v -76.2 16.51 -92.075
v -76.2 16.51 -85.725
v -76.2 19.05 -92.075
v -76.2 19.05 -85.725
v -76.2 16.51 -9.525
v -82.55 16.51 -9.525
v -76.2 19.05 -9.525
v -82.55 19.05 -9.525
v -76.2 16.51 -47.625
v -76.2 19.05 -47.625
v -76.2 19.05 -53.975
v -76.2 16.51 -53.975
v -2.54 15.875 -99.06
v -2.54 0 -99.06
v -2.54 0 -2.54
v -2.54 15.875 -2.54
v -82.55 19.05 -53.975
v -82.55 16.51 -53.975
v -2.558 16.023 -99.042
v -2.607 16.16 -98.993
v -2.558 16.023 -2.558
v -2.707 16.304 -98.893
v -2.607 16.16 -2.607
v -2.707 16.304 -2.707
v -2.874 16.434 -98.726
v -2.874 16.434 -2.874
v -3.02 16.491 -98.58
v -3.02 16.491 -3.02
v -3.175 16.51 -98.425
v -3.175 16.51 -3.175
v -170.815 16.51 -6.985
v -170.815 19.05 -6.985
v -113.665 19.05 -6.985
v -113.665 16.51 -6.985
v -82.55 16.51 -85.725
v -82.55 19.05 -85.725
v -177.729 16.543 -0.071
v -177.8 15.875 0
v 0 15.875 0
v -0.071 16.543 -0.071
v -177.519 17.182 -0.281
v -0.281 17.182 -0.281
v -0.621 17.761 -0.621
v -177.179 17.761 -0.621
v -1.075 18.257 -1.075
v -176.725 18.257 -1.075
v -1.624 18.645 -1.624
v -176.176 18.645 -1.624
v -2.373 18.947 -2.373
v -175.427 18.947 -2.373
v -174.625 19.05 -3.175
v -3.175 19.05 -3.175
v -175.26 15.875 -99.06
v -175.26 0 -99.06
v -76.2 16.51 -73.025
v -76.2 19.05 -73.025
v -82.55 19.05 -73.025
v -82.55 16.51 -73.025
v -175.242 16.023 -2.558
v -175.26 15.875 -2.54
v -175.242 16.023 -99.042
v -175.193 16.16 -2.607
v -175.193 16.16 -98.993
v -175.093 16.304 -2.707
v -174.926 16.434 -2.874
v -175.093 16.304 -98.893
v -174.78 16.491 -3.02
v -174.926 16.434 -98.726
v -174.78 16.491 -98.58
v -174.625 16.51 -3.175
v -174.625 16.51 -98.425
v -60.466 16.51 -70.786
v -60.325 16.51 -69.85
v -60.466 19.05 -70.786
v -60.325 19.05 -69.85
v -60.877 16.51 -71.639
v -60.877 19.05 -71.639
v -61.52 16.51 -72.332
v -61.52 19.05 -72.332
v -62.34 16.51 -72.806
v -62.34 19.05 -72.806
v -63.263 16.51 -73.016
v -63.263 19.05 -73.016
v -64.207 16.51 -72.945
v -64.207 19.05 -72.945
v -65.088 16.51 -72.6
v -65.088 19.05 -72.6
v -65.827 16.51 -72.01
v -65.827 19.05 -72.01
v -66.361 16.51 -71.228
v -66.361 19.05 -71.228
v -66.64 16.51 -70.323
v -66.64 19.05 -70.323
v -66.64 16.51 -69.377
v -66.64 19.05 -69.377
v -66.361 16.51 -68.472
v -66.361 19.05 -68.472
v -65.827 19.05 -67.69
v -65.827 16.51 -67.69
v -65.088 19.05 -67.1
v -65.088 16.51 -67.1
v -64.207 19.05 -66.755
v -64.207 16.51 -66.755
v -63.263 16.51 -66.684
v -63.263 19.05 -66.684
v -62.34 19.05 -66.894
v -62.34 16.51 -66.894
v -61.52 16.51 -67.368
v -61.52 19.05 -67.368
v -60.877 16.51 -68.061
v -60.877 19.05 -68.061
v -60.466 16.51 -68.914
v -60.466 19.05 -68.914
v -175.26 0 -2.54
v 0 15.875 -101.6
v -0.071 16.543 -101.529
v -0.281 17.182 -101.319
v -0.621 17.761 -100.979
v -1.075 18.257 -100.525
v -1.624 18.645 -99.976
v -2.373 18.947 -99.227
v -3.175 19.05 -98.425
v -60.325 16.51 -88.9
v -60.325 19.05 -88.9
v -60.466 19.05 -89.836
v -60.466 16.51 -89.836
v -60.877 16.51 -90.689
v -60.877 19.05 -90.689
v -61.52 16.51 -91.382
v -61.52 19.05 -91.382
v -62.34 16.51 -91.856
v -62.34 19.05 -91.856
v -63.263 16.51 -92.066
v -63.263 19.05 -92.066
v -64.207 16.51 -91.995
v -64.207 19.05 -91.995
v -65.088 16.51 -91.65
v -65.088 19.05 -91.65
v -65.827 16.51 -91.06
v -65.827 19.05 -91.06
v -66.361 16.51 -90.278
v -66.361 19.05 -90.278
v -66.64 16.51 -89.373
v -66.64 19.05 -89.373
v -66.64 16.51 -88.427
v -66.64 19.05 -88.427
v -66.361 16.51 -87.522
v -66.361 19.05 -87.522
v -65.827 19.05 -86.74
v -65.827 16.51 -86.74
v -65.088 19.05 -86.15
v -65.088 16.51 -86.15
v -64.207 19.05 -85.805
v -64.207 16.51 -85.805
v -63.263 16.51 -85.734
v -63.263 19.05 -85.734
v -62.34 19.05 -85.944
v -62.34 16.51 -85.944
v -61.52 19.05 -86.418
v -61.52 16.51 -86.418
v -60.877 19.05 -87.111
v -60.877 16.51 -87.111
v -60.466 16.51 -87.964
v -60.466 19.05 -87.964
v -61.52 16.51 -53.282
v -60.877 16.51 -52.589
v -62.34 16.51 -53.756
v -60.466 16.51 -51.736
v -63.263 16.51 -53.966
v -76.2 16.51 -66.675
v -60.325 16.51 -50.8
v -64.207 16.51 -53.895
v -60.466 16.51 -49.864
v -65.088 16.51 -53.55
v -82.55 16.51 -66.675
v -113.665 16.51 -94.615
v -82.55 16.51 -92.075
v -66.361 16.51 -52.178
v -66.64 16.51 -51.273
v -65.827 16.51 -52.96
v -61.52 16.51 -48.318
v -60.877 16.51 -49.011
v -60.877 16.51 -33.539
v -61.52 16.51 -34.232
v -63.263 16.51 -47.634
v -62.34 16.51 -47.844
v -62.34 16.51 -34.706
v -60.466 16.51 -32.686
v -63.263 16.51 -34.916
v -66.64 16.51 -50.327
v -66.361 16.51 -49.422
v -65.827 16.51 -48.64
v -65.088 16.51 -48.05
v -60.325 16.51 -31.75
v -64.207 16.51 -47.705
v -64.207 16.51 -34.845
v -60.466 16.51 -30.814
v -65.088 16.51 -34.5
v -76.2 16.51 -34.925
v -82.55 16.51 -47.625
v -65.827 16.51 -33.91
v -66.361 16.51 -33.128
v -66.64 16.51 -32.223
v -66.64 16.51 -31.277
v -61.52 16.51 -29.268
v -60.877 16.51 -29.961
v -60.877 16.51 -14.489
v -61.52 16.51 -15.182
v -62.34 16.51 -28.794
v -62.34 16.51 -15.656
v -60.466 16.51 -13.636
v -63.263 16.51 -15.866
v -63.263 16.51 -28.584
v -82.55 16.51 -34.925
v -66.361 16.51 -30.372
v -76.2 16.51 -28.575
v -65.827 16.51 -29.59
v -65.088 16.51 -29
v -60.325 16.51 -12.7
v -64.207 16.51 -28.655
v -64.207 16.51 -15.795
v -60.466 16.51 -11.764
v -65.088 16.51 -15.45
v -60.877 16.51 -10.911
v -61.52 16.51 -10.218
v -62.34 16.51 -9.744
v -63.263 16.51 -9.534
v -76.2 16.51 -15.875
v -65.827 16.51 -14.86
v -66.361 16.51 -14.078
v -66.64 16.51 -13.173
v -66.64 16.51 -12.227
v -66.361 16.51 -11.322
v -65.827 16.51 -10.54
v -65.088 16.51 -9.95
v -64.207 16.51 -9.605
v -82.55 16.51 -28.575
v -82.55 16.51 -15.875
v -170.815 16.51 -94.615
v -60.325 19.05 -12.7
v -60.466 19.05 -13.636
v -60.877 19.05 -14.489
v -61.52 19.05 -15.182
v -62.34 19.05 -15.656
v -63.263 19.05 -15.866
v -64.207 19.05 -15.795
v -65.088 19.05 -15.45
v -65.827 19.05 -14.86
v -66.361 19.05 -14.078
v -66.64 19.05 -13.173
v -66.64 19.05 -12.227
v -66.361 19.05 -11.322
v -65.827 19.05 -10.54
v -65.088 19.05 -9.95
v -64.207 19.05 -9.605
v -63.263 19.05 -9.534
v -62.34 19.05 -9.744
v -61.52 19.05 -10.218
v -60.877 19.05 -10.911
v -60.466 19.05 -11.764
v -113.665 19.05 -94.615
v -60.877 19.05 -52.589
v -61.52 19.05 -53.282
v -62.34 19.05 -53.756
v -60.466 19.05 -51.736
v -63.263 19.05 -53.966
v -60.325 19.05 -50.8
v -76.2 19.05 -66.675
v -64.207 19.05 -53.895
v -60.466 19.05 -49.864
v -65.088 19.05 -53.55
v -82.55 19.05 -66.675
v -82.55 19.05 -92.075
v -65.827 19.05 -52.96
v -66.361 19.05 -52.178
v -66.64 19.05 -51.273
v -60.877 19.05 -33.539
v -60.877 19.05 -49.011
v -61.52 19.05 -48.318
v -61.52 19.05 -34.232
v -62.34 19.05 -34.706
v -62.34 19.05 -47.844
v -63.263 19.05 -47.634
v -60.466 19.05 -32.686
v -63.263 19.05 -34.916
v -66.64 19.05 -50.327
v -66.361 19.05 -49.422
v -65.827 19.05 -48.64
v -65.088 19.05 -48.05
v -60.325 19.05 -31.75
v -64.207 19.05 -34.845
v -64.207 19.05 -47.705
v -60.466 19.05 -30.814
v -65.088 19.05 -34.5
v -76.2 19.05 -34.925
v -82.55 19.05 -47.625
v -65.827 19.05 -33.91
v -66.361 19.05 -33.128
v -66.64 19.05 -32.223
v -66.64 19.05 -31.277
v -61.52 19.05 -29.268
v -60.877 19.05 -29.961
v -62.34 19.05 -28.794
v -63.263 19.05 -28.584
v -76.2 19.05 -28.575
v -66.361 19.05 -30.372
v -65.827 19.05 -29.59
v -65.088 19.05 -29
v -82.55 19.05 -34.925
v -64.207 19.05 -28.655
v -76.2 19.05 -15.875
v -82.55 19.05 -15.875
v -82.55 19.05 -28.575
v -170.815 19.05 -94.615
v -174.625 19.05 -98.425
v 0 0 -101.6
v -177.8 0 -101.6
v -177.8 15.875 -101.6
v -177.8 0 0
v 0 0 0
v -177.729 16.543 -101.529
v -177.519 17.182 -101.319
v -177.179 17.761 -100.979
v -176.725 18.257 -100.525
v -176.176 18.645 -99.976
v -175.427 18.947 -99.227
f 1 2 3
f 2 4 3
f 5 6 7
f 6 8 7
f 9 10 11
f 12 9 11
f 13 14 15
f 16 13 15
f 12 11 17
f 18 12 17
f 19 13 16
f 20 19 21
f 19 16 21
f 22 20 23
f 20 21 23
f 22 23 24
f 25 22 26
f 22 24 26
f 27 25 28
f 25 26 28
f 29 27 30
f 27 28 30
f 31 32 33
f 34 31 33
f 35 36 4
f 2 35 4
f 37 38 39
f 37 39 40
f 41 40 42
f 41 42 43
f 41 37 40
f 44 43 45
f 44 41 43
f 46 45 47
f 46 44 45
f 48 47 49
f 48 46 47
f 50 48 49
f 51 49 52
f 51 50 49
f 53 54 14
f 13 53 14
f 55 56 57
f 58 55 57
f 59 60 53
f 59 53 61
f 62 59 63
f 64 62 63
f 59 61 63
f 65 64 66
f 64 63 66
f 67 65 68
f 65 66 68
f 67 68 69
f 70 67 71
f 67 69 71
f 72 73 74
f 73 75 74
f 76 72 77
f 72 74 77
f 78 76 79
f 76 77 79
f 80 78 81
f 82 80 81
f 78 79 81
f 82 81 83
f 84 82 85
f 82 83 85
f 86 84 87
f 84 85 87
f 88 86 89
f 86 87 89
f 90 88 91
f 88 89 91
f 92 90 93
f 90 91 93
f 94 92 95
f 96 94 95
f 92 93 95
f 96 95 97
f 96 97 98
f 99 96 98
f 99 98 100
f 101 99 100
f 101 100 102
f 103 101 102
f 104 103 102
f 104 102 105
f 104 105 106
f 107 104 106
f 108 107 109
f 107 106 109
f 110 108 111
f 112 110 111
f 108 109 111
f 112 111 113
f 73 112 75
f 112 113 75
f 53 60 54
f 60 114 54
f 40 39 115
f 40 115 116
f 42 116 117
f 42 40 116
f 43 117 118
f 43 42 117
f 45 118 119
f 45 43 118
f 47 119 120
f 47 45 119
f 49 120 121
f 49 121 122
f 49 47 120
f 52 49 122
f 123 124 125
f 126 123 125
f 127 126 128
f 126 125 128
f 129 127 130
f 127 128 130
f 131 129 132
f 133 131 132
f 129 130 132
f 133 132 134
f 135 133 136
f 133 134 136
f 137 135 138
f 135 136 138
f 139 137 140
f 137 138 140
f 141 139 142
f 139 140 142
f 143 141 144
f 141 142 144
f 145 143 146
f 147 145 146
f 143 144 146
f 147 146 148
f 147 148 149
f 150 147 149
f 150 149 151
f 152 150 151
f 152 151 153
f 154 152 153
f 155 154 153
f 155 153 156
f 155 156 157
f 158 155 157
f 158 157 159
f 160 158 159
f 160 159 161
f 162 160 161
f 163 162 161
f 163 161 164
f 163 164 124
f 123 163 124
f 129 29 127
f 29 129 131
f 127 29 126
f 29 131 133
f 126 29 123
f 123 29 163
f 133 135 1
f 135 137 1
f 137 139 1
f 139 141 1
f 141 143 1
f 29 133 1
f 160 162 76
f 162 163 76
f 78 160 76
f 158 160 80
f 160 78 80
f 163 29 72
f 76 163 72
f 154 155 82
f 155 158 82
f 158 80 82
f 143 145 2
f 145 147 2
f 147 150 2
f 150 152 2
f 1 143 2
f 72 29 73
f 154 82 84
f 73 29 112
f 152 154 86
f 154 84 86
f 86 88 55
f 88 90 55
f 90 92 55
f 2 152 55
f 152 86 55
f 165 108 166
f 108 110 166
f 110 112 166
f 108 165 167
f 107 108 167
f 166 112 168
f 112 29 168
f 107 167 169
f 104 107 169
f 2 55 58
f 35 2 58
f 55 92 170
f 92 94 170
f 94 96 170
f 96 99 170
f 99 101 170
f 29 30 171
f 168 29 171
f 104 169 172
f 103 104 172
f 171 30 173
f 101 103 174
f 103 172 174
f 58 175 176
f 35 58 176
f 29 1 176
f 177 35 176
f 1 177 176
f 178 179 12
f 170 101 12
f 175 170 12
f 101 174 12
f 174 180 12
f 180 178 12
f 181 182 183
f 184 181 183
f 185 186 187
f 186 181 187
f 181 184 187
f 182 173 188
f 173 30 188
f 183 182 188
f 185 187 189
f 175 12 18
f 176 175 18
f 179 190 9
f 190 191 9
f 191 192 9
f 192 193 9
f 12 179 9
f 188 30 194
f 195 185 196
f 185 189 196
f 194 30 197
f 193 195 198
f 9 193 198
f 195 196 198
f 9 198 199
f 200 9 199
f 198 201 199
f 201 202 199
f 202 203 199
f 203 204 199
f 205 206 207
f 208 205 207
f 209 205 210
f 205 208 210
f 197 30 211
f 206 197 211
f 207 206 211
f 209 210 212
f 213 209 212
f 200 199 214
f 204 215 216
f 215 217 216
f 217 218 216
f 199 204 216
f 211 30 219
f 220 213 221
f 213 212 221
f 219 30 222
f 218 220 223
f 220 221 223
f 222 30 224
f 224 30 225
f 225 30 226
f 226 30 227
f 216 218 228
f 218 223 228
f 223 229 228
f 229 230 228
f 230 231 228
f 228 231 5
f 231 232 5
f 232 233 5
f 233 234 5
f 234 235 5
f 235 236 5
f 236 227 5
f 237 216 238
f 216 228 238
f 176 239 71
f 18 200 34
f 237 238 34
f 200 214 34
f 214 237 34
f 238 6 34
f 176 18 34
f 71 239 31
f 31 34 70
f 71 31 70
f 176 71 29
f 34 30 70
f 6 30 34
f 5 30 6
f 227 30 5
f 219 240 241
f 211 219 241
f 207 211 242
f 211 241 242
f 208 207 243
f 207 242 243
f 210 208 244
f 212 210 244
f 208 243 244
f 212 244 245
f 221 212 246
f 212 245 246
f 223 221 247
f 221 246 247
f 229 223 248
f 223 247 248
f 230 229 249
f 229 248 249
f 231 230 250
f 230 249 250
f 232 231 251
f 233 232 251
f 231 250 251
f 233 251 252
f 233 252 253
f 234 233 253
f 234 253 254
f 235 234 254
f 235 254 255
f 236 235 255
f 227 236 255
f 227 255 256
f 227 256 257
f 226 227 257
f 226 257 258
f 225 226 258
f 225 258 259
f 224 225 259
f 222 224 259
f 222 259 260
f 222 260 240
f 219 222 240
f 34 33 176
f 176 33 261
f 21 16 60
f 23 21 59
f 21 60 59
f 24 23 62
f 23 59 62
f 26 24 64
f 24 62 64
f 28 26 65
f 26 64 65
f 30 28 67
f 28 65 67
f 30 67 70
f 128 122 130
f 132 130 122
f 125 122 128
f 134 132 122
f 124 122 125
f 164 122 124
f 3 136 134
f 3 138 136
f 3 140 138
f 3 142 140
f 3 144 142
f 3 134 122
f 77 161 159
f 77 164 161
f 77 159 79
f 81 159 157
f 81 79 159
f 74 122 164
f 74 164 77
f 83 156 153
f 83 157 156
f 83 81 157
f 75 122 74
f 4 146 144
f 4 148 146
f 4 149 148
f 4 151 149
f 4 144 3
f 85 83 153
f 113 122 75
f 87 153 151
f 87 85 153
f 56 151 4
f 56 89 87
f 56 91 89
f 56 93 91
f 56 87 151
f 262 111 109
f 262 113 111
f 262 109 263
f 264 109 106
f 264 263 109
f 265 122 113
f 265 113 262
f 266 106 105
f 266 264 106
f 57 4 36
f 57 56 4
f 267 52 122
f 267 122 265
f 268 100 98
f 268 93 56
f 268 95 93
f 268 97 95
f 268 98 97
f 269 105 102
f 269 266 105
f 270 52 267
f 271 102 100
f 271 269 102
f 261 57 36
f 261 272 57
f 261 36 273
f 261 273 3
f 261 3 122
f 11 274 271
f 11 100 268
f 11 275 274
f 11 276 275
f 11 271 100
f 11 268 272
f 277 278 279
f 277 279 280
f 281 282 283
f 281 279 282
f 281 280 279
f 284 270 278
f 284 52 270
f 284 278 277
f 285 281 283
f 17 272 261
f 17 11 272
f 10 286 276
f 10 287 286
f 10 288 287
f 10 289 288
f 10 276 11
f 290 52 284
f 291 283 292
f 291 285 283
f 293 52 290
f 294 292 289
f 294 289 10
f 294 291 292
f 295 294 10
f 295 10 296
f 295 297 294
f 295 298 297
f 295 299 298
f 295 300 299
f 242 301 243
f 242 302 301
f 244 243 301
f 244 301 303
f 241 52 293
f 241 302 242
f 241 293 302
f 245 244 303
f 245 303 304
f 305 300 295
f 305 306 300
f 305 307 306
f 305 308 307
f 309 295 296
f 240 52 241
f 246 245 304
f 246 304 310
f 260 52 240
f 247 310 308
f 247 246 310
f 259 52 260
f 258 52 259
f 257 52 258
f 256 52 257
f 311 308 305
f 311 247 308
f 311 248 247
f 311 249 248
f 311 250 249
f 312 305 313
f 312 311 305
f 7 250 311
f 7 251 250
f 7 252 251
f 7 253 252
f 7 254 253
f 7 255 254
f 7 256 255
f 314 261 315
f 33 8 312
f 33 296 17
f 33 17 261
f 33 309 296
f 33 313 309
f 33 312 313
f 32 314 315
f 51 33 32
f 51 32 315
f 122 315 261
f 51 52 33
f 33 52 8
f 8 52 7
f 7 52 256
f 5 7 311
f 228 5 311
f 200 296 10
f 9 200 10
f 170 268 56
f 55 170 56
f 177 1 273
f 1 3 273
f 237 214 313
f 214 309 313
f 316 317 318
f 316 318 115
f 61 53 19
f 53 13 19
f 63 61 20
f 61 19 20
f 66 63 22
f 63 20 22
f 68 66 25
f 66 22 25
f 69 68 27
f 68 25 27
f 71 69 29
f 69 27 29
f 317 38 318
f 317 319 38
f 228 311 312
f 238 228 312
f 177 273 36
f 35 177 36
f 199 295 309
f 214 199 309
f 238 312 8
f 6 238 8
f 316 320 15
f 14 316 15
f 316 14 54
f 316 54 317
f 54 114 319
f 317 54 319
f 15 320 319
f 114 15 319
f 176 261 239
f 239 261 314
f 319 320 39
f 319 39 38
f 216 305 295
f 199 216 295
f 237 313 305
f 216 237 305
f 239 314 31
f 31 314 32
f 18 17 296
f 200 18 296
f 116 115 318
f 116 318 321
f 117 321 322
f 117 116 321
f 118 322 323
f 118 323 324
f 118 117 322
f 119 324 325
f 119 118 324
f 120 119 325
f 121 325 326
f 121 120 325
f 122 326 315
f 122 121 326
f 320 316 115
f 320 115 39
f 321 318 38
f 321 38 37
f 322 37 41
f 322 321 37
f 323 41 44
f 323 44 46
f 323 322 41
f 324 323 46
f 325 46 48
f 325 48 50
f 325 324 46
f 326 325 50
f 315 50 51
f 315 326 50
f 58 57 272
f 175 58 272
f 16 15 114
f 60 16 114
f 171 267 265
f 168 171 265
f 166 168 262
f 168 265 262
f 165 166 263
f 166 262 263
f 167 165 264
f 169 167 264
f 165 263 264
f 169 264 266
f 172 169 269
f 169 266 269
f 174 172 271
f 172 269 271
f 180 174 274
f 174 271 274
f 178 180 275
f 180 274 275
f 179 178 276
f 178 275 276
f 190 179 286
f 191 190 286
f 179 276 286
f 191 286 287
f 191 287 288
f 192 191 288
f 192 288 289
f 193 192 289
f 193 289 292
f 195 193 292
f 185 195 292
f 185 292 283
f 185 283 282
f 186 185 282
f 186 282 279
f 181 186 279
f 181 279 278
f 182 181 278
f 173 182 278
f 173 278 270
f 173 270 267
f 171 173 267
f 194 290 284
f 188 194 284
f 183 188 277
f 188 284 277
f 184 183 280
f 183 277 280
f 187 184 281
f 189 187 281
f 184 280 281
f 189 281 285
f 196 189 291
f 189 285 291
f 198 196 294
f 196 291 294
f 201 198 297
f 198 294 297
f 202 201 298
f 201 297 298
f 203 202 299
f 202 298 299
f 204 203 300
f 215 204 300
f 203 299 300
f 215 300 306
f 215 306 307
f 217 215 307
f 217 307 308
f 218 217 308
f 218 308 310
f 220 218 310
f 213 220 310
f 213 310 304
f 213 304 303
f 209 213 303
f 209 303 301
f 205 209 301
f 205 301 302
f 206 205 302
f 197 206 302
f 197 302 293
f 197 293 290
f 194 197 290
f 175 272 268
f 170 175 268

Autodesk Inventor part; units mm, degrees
ref_plane "YZ Plane" through (0, 0, 0) normal (1, 0, 0) x (0, 1, 0)
ref_plane "XZ Plane" through (0, 0, 0) normal (0, 1, 0) x (-1, 0, 0)
ref_plane "XY Plane" through (0, 0, 0) normal (0, 0, 1) x (1, 0, 0)
sketch "Sketch1" plane through (0, 0, 0) normal (0, 1, 0) x (-1, 0, 0)
  line L0 (0, 0) -> (177.8, 0)
  line L1 (177.8, 0) -> (177.8, -101.6)
  line L2 (177.8, -101.6) -> (0, -101.6)
  line L3 (0, -101.6) -> (0, 0)
  point P0 (177.8, -50.8)
  point P1 (88.9, 0)
  point P2 (0, -50.8)
  dimension "d0" = 177.8
  dimension "d1" = 101.6
extrude "Extrusion1" add sketch "Sketch1" along normal blind 19.05
fillet "Fillet1" radius 3.175 4 edges at (-88.9, 19.05, 0) (-177.8, 19.05, -50.8) (-88.9, 19.05, -101.6) (0, 19.05, -50.8)
sketch "Sketch2" plane through (0, 19.05, 0) normal (0, 1, 0) x (1, 0, 0)
  line L0 (-170.815, 6.985) -> (-113.665, 6.985)
  line L1 (-113.665, 6.985) -> (-113.665, 94.615)
  line L2 (-113.665, 94.615) -> (-170.815, 94.615)
  line L3 (-170.815, 94.615) -> (-170.815, 6.985)
  line L4 (-177.8, 0) -> (0, 0) projected
  line L5 (-177.8, 101.6) -> (-177.8, 0) projected
  line L6 (-82.55, 9.525) -> (-76.2, 9.525)
  line L7 (-76.2, 9.525) -> (-76.2, 15.875)
  line L8 (-76.2, 15.875) -> (-82.55, 15.875)
  line L9 (-82.55, 15.875) -> (-82.55, 9.525)
  line L10 (0, 0) -> (0, 101.6) projected
  line L11 (-82.55, 28.575) -> (-76.2, 28.575)
  line L12 (-76.2, 28.575) -> (-76.2, 34.925)
  line L13 (-76.2, 34.925) -> (-82.55, 34.925)
  line L14 (-82.55, 34.925) -> (-82.55, 28.575)
  line L15 (-82.55, 47.625) -> (-76.2, 47.625)
  line L16 (-76.2, 47.625) -> (-76.2, 53.975)
  line L17 (-76.2, 53.975) -> (-82.55, 53.975)
  line L18 (-82.55, 53.975) -> (-82.55, 47.625)
  line L19 (-82.55, 66.675) -> (-76.2, 66.675)
  line L20 (-76.2, 66.675) -> (-76.2, 73.025)
  line L21 (-76.2, 73.025) -> (-82.55, 73.025)
  line L22 (-82.55, 73.025) -> (-82.55, 66.675)
  line L23 (-82.55, 85.725) -> (-76.2, 85.725)
  line L24 (-76.2, 85.725) -> (-76.2, 92.075)
  line L25 (-76.2, 92.075) -> (-82.55, 92.075)
  line L26 (-82.55, 92.075) -> (-82.55, 85.725)
  circle A0 centre (-63.5, 12.7) radius 3.175
  circle A1 centre (-63.5, 31.75) radius 3.175
  circle A2 centre (-63.5, 50.8) radius 3.175
  circle A3 centre (-63.5, 69.85) radius 3.175
  circle A4 centre (-63.5, 88.9) radius 3.175
  line L27 (0, 101.6) -> (-177.8, 101.6) projected
  point P0 (-79.375, 15.875)
  point P1 (-79.375, 28.575)
  point P2 (-79.375, 34.925)
  point P3 (-79.375, 47.625)
  dimension "d47" = 87.63
  dimension "d48" = 57.15
  dimension "d49" = 6.985
  dimension "d50" = 6.985
  dimension "d51" = 6.35
  dimension "d52" = 6.35
  dimension "d53" = 9.525
  dimension "d54" = 76.2
  dimension "d55" = 6.35
  dimension "d56" = 6.35
  dimension "d57" = 6.35
  dimension "d58" = 6.35
  dimension "d59" = 6.35
  dimension "d60" = 6.35
  dimension "d61" = 6.35
  dimension "d62" = 6.35
  dimension "d63" = 12.7
  dimension "d64" = 12.7
  dimension "d65" = 12.7
  dimension "d66" = 12.7
  dimension "d67" = 76.2
  dimension "d68" = 6.35
  dimension "d69" = 6.35
  dimension "d70" = 6.35
  dimension "d71" = 6.35
  dimension "d72" = 6.35
  dimension "d73" = 63.5
  dimension "d74" = 63.5
  dimension "d75" = 63.5
  dimension "d76" = 63.5
  dimension "d77" = 63.5
  dimension "d78" = 12.7
  dimension "d79" = 19.05
  dimension "d80" = 19.05
  dimension "d81" = 19.05
  dimension "d82" = 19.05
shell "Shell2" thickness 2.54 removed faces 1 at (-59.2667, 0, -33.8667)
extrude "Extrusion2" cut sketch "Sketch2" against normal blind 19.05 contours L3 L2 L1 L0 | L9 L8 L7 L6 | L14 L13 L12 L11 | L18 L17 L16 L15 | L22 L21 L20 L19 | L26 L25 L24 L23 | A0 | A1 | A2 | A3 | A4
properties part number "CaseTop" material "PC/ABS Plastic"
